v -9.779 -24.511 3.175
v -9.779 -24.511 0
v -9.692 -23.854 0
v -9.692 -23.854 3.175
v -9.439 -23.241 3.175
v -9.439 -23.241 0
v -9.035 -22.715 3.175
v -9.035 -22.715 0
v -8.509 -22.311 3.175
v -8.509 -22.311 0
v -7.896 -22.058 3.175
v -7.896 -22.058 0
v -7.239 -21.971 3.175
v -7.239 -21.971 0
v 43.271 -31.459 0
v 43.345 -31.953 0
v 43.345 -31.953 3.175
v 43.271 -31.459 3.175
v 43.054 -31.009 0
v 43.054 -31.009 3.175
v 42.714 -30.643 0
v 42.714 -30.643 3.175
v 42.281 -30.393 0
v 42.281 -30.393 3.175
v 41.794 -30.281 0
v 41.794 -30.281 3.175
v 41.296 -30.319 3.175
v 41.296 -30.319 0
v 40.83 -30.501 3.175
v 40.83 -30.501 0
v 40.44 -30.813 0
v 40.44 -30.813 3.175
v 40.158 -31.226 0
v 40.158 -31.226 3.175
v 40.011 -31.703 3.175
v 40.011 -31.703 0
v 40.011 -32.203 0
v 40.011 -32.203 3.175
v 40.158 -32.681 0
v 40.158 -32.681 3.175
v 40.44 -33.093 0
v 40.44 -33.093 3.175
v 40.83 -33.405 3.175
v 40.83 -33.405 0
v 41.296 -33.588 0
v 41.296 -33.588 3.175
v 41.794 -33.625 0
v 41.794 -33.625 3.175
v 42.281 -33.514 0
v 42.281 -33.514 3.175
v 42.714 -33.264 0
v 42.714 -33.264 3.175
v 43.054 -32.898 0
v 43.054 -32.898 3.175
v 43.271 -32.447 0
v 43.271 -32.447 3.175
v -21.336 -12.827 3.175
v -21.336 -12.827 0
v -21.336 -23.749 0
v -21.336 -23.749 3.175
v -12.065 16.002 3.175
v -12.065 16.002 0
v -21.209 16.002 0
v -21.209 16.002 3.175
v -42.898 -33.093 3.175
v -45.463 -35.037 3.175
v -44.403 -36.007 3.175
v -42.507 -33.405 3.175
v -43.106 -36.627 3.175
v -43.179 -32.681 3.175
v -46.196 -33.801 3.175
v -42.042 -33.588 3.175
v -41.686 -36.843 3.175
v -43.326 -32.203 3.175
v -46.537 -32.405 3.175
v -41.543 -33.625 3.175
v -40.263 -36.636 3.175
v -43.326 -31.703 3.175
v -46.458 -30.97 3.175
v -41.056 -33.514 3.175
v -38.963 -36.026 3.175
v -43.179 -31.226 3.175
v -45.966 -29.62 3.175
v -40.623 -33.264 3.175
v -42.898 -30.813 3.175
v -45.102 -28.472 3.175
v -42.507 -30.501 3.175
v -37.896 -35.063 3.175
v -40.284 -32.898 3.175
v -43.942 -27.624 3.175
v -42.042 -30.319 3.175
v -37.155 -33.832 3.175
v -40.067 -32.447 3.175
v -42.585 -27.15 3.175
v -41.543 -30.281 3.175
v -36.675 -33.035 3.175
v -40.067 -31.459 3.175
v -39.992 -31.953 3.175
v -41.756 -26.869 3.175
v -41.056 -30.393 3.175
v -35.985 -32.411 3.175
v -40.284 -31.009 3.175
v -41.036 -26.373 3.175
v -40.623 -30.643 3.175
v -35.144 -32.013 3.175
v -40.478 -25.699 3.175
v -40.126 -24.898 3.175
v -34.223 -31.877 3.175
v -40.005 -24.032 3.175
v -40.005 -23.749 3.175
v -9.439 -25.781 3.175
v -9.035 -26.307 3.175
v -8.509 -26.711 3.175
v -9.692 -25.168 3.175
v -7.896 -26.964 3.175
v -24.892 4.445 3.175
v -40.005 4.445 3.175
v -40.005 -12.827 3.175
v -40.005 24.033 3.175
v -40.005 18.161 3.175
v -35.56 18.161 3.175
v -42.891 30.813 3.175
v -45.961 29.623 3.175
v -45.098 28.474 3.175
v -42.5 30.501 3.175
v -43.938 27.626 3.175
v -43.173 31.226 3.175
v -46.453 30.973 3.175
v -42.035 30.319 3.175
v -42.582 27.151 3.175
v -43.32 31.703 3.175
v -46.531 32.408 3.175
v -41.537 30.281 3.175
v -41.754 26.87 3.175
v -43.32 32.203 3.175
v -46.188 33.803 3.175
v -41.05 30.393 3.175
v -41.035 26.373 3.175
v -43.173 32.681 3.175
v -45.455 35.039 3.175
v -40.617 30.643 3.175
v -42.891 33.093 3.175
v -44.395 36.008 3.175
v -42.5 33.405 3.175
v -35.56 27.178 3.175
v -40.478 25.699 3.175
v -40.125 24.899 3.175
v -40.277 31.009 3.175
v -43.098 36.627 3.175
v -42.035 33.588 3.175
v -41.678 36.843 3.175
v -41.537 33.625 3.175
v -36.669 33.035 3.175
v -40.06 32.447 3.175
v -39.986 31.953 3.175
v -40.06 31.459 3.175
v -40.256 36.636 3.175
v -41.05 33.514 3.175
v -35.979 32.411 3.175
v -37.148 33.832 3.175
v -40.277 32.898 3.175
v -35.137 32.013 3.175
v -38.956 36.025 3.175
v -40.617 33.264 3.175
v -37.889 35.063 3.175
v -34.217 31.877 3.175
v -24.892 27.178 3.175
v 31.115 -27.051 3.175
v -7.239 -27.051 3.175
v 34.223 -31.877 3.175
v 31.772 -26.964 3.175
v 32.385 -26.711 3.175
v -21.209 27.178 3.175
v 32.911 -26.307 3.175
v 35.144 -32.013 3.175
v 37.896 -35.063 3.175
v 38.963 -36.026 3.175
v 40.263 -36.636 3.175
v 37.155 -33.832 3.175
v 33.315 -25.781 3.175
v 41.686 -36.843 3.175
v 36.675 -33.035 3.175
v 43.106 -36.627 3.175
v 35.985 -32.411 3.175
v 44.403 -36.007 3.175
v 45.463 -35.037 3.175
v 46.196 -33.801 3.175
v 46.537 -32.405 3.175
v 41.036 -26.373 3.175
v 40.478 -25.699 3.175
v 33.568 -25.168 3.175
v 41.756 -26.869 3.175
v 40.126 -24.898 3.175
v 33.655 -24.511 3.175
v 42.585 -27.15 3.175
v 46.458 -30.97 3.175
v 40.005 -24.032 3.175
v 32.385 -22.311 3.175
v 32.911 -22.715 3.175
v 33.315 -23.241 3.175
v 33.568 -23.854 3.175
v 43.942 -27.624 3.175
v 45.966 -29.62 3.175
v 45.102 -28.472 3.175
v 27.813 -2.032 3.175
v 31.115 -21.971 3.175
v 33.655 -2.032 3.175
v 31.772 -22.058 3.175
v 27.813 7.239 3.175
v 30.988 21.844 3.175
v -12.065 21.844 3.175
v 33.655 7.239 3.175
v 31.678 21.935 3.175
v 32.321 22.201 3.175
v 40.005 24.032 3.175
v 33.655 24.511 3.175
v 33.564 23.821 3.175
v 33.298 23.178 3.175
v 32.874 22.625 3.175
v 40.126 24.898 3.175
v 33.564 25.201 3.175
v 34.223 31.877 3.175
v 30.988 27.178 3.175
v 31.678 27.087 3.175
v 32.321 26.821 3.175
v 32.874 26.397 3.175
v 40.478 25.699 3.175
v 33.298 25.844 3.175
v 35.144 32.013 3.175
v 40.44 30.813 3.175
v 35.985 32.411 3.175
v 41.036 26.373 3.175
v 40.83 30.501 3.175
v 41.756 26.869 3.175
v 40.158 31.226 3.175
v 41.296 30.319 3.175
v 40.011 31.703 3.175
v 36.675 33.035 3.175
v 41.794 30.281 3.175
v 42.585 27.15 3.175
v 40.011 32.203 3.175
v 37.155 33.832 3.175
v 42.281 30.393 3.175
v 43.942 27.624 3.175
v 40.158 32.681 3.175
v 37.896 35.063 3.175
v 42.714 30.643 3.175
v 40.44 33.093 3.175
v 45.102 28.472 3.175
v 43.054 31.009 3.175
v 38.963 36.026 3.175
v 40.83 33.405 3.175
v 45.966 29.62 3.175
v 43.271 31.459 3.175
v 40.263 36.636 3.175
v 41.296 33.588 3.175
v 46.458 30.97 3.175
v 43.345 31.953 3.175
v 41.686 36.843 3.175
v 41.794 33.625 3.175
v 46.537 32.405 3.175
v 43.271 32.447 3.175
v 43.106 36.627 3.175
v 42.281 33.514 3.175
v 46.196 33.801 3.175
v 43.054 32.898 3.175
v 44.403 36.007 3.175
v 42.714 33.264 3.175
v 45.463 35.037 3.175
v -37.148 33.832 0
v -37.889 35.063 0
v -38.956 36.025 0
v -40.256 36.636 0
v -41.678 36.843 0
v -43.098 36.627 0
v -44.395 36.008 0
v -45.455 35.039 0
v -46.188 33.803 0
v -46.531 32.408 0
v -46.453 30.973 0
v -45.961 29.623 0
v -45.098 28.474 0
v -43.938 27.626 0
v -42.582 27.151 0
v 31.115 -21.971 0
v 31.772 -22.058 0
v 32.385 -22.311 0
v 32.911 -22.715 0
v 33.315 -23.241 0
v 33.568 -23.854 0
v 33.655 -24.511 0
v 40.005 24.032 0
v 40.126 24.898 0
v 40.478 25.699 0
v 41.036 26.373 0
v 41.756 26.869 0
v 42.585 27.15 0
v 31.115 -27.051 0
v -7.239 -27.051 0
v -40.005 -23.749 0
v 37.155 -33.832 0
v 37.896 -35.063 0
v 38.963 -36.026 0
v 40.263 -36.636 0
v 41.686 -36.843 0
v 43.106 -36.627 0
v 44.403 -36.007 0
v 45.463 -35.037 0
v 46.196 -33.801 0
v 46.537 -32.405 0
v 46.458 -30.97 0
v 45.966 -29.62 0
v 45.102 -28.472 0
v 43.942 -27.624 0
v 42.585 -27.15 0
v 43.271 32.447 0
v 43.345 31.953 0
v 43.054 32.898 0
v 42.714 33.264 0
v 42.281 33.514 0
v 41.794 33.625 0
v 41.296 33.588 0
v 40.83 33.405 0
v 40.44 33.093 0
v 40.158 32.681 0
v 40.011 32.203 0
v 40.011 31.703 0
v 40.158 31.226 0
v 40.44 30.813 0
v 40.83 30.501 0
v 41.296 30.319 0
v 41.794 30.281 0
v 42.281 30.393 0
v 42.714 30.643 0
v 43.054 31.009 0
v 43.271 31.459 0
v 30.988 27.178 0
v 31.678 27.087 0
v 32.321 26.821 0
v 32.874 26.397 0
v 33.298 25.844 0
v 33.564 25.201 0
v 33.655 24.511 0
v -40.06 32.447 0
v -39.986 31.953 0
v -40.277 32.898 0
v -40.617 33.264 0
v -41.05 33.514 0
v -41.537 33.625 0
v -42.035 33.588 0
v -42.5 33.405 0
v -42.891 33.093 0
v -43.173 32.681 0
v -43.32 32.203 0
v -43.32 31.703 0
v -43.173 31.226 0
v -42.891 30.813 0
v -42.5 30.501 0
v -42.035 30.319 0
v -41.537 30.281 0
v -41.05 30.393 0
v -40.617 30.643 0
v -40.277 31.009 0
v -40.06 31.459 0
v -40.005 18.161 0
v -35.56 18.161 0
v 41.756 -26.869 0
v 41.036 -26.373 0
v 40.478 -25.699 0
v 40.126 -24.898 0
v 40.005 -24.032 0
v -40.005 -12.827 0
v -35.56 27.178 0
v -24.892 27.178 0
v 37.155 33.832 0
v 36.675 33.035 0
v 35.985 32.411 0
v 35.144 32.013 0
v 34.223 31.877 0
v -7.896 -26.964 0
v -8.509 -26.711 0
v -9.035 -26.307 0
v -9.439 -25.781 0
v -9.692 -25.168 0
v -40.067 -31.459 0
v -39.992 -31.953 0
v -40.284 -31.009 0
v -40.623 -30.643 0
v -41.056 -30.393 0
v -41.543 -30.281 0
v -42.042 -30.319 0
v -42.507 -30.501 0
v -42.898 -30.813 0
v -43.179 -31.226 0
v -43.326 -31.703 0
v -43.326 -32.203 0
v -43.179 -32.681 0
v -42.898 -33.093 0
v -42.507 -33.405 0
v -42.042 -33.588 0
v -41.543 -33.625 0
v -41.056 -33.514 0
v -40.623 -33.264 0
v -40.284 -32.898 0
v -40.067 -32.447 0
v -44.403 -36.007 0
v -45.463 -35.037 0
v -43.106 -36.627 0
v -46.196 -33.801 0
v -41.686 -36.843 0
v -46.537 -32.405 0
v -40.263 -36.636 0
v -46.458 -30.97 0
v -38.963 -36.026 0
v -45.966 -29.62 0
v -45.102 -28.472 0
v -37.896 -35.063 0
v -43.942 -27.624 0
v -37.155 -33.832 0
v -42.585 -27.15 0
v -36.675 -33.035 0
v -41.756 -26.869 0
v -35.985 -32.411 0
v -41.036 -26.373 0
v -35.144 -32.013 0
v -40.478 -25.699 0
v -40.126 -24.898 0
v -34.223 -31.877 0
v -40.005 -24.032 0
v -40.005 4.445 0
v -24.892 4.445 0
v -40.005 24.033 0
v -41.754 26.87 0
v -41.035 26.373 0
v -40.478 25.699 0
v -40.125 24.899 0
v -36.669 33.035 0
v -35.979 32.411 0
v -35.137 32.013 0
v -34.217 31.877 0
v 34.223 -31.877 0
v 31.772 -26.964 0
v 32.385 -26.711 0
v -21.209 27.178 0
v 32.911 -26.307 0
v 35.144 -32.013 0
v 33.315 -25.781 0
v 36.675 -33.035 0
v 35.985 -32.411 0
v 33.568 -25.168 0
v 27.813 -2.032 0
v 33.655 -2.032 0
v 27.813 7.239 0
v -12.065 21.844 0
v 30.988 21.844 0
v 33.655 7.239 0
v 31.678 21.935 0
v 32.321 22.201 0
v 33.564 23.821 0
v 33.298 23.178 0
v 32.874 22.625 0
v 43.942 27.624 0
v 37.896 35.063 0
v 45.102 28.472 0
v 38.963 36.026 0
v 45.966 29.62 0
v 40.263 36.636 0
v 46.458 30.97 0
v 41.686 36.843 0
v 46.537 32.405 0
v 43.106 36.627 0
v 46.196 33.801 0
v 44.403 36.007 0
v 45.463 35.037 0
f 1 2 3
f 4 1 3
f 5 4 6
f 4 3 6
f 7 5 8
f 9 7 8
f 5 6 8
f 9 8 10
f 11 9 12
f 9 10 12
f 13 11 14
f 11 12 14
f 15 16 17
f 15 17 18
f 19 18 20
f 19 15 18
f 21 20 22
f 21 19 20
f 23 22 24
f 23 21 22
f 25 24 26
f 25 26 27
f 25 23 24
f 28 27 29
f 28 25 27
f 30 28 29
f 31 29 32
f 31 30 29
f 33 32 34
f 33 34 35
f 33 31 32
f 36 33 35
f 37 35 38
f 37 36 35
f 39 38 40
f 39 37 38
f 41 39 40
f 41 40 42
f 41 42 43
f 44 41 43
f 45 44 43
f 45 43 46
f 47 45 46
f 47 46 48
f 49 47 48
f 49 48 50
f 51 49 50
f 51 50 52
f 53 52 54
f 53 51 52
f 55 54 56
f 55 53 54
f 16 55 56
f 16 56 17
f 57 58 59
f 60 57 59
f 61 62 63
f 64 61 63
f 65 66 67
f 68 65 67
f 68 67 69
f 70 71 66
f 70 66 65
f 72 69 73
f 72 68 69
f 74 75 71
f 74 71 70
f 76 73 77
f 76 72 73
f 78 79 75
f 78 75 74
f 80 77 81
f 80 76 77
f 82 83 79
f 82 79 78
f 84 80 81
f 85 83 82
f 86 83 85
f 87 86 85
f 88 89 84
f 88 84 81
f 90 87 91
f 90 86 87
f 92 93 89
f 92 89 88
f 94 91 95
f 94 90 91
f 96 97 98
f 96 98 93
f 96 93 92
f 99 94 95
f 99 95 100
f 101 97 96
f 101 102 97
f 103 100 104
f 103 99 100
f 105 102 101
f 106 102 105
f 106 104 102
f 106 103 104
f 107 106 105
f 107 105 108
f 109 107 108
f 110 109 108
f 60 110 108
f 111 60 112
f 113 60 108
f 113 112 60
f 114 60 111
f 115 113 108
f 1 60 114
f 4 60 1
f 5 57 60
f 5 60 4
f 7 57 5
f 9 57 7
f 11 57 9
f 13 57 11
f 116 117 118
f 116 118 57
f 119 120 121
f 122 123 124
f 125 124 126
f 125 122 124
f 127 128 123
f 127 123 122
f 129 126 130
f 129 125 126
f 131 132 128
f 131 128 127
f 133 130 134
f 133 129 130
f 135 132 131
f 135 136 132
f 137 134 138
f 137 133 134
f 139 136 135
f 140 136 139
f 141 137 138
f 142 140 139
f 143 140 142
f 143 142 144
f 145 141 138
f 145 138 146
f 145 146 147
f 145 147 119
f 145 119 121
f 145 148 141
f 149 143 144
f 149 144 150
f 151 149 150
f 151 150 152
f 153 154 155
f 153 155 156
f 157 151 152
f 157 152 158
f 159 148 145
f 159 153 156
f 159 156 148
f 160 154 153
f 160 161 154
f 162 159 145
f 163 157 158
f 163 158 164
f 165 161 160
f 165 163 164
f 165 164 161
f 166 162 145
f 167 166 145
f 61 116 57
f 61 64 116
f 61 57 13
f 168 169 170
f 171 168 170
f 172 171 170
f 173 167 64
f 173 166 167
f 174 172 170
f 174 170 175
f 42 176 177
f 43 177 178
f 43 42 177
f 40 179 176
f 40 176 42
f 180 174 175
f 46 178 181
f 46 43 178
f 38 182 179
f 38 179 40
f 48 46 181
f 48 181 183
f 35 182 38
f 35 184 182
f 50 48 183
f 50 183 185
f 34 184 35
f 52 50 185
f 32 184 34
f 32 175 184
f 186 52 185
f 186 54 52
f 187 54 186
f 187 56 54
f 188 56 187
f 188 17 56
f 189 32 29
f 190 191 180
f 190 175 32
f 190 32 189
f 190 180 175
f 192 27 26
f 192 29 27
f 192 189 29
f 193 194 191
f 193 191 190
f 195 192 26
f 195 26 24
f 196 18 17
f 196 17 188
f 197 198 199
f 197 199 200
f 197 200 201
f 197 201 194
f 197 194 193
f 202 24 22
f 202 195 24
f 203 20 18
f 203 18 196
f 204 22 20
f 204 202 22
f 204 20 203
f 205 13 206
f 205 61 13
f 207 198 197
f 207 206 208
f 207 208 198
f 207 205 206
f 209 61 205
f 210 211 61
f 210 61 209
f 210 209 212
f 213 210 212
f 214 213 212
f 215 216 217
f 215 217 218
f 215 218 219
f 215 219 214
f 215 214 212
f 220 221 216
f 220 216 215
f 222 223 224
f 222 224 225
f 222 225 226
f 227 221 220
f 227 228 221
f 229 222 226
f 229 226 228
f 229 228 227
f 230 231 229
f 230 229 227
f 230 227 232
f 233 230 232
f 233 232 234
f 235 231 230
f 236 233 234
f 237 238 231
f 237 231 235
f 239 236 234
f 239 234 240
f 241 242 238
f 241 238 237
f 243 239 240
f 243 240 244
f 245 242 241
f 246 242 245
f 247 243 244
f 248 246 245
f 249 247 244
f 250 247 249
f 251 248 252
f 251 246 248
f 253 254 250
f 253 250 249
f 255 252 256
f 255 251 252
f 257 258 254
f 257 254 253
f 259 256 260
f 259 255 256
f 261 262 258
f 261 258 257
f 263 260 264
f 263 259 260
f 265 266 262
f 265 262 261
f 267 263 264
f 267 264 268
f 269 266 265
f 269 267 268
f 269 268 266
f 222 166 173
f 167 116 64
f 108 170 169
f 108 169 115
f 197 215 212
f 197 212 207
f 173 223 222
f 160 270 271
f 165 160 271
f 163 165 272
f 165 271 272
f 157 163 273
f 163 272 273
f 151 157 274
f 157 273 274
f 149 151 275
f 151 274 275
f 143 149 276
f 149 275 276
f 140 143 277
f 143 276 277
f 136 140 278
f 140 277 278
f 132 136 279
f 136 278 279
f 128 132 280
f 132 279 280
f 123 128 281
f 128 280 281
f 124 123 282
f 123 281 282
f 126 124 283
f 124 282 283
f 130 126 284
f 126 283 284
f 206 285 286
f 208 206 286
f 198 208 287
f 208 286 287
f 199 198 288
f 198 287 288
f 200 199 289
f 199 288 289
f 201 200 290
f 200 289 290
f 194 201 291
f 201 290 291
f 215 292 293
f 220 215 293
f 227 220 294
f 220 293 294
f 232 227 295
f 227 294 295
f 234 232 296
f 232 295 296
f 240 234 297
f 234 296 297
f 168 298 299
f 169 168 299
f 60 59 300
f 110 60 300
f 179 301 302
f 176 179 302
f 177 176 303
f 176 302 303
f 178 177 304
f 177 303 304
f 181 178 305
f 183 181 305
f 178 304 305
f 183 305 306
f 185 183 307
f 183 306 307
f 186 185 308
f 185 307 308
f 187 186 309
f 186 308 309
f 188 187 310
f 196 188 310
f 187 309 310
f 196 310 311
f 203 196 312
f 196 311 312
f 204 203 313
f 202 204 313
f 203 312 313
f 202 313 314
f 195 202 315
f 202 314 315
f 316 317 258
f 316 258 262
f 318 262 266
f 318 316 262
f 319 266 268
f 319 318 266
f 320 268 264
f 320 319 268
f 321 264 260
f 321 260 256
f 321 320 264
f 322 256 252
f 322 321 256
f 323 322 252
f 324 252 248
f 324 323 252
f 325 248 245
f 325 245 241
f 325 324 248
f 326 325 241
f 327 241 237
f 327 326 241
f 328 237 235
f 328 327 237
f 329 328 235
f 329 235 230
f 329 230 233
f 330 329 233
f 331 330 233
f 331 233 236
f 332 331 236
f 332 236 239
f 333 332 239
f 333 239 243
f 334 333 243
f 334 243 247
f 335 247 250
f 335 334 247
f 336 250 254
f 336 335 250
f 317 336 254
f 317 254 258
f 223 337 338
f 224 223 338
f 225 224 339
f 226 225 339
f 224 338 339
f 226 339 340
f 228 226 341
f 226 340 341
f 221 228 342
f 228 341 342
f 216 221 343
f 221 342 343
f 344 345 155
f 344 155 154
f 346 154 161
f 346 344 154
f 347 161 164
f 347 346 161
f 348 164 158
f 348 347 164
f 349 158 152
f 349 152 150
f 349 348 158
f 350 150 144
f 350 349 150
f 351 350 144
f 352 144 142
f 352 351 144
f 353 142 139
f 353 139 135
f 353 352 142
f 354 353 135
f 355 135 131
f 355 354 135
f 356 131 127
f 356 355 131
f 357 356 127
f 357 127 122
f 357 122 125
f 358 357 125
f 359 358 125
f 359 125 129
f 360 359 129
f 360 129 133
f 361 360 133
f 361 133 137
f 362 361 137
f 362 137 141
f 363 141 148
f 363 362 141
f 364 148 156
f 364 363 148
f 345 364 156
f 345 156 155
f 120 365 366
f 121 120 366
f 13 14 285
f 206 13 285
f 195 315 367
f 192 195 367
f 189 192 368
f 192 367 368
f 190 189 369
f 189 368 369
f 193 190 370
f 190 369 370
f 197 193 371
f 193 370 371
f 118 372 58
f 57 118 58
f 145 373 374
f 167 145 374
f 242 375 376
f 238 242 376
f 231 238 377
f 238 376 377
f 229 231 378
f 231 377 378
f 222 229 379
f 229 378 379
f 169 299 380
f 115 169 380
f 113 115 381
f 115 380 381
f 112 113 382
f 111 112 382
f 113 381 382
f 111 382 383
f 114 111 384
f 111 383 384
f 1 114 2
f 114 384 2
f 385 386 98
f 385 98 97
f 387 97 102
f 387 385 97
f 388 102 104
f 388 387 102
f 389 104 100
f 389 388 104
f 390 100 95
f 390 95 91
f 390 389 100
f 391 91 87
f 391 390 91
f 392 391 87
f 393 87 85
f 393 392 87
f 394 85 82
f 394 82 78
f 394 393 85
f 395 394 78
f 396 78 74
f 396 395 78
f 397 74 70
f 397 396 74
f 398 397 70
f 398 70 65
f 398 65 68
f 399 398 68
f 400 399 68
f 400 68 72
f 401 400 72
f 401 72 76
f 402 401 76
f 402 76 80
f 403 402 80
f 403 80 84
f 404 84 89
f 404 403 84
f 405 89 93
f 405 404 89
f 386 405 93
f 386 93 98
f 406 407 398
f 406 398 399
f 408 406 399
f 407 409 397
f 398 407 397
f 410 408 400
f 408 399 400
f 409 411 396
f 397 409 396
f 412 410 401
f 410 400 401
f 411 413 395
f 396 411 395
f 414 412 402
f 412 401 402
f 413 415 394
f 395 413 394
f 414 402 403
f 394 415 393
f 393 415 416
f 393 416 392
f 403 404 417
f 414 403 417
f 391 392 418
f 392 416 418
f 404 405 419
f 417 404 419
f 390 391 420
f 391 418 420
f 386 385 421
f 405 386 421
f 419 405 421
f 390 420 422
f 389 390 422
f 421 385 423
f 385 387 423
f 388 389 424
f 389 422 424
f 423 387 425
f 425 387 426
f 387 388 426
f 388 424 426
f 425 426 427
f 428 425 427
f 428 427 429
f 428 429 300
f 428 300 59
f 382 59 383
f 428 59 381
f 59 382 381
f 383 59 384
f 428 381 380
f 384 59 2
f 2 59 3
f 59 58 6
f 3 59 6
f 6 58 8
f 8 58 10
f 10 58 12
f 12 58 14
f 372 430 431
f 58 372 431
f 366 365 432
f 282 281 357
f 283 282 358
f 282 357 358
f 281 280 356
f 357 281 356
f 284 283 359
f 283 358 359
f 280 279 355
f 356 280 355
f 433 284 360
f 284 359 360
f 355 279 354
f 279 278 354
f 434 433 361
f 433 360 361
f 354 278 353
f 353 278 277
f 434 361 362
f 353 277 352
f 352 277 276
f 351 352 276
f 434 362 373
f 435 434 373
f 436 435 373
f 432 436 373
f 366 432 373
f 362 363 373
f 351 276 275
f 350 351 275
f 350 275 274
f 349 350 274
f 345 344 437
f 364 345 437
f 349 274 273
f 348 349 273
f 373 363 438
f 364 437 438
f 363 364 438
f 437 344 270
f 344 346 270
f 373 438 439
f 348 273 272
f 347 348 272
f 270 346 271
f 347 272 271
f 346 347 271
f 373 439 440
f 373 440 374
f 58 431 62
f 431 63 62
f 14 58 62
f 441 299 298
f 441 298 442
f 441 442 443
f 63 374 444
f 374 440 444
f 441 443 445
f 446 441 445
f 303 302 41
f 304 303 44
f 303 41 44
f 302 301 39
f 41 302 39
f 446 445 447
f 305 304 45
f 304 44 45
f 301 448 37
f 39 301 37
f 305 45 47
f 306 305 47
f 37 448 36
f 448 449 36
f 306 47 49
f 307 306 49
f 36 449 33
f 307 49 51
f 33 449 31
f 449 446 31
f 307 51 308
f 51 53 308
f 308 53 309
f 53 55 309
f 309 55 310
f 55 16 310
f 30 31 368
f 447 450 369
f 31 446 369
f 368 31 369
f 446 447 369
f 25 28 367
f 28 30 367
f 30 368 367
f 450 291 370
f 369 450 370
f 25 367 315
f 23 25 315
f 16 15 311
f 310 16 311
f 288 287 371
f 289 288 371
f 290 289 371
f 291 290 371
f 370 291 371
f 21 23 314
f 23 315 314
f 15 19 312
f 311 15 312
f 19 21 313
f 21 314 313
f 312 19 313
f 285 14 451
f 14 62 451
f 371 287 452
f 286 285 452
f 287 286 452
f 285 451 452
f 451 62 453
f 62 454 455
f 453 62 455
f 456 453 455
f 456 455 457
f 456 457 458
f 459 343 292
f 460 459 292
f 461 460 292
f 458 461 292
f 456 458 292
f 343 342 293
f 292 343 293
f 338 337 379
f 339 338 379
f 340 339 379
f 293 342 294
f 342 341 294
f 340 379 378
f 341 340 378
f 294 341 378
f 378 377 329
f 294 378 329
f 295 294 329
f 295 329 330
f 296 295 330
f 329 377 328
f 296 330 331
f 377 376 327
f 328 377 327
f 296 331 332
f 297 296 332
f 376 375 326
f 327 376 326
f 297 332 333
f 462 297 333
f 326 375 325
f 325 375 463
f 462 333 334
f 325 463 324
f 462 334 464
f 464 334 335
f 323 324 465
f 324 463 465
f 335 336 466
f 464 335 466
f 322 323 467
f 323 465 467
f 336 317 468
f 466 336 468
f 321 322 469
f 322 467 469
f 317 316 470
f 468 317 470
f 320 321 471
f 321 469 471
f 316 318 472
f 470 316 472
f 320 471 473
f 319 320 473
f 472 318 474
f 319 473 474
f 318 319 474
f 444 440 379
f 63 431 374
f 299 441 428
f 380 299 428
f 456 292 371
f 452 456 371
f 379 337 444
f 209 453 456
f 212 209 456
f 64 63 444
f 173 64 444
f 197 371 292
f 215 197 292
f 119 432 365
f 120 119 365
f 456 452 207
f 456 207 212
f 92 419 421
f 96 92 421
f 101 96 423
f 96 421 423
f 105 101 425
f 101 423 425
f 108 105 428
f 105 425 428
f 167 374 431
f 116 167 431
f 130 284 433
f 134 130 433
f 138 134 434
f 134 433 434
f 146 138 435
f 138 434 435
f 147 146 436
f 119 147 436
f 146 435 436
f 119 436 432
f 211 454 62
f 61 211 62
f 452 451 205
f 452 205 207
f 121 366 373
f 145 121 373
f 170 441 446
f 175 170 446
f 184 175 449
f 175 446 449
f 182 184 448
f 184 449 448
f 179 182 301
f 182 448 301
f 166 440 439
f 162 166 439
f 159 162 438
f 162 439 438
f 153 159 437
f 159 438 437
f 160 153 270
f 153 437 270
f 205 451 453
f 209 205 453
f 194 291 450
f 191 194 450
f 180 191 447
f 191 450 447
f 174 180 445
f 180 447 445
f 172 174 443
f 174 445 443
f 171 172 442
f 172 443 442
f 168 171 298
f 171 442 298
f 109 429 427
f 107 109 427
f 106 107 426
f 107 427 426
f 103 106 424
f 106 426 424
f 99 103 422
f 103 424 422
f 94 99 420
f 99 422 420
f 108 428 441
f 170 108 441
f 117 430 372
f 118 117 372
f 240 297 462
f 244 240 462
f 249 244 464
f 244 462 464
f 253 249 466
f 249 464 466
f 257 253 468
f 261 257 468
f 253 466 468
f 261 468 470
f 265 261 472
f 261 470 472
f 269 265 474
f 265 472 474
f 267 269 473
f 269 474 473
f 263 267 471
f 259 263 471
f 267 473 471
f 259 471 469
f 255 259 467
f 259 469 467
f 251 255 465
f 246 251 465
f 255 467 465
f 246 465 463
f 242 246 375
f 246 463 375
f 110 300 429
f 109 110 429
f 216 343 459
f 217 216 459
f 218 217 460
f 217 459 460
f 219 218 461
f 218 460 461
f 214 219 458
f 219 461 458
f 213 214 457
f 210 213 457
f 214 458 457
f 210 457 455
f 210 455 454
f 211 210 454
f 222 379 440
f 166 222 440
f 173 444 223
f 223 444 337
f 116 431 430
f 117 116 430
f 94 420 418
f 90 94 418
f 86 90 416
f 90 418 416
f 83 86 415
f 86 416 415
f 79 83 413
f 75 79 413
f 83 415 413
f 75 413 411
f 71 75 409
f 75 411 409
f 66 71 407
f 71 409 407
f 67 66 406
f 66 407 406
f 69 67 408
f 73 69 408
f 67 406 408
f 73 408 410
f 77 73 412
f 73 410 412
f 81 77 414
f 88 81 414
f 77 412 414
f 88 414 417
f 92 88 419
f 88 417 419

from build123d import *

# Parameters (mm, degrees)
F0_R     = 1.6764
F0_W     = 5.842
F0_H     = 9.271
F1_DEPTH = 3.175


with BuildPart() as f1:
    # F0 (on Top) → F1 (new body)
    with BuildSketch(Plane.XY):
        with BuildLine():
            Line((34.223325677, 31.877), (-34.2168985559, 31.877))
            ThreePointArc((-34.2168985559, 31.877), (-35.9785916336, 32.4105870259), (-37.1481482894, 33.832))
            ThreePointArc((-37.1481482894, 33.832), (-45.4553961584, 35.0385567114), (-42.5824696374, 27.1510704541))
            ThreePointArc((-42.5824696374, 27.1510704541), (-40.7327787287, 26.0556077803), (-40.005, 24.0328045152))
            Line((-40.005, 24.0328045152), (-40.005, 18.161))
            Line((-40.005, 18.161), (-35.56, 18.161))
            Line((-35.56, 18.161), (-35.56, 27.178))
            Line((-35.56, 27.178), (-24.892, 27.178))
            Line((-24.892, 27.178), (-24.892, 4.445))
            Line((-24.892, 4.445), (-35.56, 4.445))
            Line((-35.56, 4.445), (-40.005, 4.445))
            Line((-40.005, 4.445), (-40.005, -12.827))
            Line((-40.005, -12.827), (-21.336, -12.827))
            Line((-21.336, -12.827), (-21.336, -23.749))
            Line((-21.336, -23.749), (-40.005, -23.749))
            Line((-40.005, -23.749), (-40.005, -24.0315756363))
            ThreePointArc((-40.005, -24.0315756363), (-40.7335995831, -26.0553715746), (-42.585, -27.1503253858))
            ThreePointArc((-42.585, -27.1503253858), (-45.4630746991, -35.0370175843), (-37.1545754104, -33.832))
            ThreePointArc((-37.1545754104, -33.832), (-35.9850187547, -32.4105870259), (-34.223325677, -31.877))
            Line((-34.223325677, -31.877), (34.223325677, -31.877))
            ThreePointArc((34.223325677, -31.877), (35.9850187547, -32.4105870259), (37.1545754104, -33.832))
            ThreePointArc((37.1545754104, -33.832), (45.4630746991, -35.0370175843), (42.585, -27.1503253858))
            ThreePointArc((42.585, -27.1503253858), (40.7335995831, -26.0553715746), (40.005, -24.0315756363))
            Line((40.005, -24.0315756363), (40.005, 24.0315756363))
            ThreePointArc((40.005, 24.0315756363), (40.7335995831, 26.0553715746), (42.585, 27.1503253858))
            ThreePointArc((42.585, 27.1503253858), (45.4630746991, 35.0370175843), (37.1545754104, 33.832))
            ThreePointArc((37.1545754104, 33.832), (35.9850187547, 32.4105870259), (34.223325677, 31.877))
        make_face()
        with Locations((-41.6687, -31.9532)):
            Circle(F0_R, mode=Mode.SUBTRACT)
        with BuildLine():
            Line((31.115, -27.051), (-7.239, -27.051))
            ThreePointArc((-7.239, -27.051), (-9.0350512242, -26.3070512242), (-9.779, -24.511))
            ThreePointArc((-9.779, -24.511), (-9.0350512242, -22.7149487758), (-7.239, -21.971))
            Line((-7.239, -21.971), (31.115, -21.971))
            ThreePointArc((31.115, -21.971), (32.9110512242, -22.7149487758), (33.655, -24.511))
            ThreePointArc((33.655, -24.511), (32.9110512242, -26.3070512242), (31.115, -27.051))
        make_face(mode=Mode.SUBTRACT)
        with Locations((41.6687, -31.9532)):
            Circle(F0_R, mode=Mode.SUBTRACT)
        with Locations((-41.6622728789, 31.9532)):
            Circle(F0_R, mode=Mode.SUBTRACT)
        with Locations((30.734, 2.6035)):
            Rectangle(F0_W, F0_H, mode=Mode.SUBTRACT)
        with BuildLine():
            Line((-21.209, 16.002), (-21.209, 27.178))
            Line((-21.209, 27.178), (30.988, 27.178))
            ThreePointArc((30.988, 27.178), (32.8738537854, 26.3968537854), (33.655, 24.511))
            ThreePointArc((33.655, 24.511), (32.8738537854, 22.6251462146), (30.988, 21.844))
            Line((30.988, 21.844), (-9.779, 21.844))
            Line((-9.779, 21.844), (-12.065, 21.844))
            Line((-12.065, 21.844), (-12.065, 16.002))
            Line((-12.065, 16.002), (-21.209, 16.002))
        make_face(mode=Mode.SUBTRACT)
        with Locations((41.6687, 31.9532)):
            Circle(F0_R, mode=Mode.SUBTRACT)
    extrude(amount=F1_DEPTH)


solid = f1.part
